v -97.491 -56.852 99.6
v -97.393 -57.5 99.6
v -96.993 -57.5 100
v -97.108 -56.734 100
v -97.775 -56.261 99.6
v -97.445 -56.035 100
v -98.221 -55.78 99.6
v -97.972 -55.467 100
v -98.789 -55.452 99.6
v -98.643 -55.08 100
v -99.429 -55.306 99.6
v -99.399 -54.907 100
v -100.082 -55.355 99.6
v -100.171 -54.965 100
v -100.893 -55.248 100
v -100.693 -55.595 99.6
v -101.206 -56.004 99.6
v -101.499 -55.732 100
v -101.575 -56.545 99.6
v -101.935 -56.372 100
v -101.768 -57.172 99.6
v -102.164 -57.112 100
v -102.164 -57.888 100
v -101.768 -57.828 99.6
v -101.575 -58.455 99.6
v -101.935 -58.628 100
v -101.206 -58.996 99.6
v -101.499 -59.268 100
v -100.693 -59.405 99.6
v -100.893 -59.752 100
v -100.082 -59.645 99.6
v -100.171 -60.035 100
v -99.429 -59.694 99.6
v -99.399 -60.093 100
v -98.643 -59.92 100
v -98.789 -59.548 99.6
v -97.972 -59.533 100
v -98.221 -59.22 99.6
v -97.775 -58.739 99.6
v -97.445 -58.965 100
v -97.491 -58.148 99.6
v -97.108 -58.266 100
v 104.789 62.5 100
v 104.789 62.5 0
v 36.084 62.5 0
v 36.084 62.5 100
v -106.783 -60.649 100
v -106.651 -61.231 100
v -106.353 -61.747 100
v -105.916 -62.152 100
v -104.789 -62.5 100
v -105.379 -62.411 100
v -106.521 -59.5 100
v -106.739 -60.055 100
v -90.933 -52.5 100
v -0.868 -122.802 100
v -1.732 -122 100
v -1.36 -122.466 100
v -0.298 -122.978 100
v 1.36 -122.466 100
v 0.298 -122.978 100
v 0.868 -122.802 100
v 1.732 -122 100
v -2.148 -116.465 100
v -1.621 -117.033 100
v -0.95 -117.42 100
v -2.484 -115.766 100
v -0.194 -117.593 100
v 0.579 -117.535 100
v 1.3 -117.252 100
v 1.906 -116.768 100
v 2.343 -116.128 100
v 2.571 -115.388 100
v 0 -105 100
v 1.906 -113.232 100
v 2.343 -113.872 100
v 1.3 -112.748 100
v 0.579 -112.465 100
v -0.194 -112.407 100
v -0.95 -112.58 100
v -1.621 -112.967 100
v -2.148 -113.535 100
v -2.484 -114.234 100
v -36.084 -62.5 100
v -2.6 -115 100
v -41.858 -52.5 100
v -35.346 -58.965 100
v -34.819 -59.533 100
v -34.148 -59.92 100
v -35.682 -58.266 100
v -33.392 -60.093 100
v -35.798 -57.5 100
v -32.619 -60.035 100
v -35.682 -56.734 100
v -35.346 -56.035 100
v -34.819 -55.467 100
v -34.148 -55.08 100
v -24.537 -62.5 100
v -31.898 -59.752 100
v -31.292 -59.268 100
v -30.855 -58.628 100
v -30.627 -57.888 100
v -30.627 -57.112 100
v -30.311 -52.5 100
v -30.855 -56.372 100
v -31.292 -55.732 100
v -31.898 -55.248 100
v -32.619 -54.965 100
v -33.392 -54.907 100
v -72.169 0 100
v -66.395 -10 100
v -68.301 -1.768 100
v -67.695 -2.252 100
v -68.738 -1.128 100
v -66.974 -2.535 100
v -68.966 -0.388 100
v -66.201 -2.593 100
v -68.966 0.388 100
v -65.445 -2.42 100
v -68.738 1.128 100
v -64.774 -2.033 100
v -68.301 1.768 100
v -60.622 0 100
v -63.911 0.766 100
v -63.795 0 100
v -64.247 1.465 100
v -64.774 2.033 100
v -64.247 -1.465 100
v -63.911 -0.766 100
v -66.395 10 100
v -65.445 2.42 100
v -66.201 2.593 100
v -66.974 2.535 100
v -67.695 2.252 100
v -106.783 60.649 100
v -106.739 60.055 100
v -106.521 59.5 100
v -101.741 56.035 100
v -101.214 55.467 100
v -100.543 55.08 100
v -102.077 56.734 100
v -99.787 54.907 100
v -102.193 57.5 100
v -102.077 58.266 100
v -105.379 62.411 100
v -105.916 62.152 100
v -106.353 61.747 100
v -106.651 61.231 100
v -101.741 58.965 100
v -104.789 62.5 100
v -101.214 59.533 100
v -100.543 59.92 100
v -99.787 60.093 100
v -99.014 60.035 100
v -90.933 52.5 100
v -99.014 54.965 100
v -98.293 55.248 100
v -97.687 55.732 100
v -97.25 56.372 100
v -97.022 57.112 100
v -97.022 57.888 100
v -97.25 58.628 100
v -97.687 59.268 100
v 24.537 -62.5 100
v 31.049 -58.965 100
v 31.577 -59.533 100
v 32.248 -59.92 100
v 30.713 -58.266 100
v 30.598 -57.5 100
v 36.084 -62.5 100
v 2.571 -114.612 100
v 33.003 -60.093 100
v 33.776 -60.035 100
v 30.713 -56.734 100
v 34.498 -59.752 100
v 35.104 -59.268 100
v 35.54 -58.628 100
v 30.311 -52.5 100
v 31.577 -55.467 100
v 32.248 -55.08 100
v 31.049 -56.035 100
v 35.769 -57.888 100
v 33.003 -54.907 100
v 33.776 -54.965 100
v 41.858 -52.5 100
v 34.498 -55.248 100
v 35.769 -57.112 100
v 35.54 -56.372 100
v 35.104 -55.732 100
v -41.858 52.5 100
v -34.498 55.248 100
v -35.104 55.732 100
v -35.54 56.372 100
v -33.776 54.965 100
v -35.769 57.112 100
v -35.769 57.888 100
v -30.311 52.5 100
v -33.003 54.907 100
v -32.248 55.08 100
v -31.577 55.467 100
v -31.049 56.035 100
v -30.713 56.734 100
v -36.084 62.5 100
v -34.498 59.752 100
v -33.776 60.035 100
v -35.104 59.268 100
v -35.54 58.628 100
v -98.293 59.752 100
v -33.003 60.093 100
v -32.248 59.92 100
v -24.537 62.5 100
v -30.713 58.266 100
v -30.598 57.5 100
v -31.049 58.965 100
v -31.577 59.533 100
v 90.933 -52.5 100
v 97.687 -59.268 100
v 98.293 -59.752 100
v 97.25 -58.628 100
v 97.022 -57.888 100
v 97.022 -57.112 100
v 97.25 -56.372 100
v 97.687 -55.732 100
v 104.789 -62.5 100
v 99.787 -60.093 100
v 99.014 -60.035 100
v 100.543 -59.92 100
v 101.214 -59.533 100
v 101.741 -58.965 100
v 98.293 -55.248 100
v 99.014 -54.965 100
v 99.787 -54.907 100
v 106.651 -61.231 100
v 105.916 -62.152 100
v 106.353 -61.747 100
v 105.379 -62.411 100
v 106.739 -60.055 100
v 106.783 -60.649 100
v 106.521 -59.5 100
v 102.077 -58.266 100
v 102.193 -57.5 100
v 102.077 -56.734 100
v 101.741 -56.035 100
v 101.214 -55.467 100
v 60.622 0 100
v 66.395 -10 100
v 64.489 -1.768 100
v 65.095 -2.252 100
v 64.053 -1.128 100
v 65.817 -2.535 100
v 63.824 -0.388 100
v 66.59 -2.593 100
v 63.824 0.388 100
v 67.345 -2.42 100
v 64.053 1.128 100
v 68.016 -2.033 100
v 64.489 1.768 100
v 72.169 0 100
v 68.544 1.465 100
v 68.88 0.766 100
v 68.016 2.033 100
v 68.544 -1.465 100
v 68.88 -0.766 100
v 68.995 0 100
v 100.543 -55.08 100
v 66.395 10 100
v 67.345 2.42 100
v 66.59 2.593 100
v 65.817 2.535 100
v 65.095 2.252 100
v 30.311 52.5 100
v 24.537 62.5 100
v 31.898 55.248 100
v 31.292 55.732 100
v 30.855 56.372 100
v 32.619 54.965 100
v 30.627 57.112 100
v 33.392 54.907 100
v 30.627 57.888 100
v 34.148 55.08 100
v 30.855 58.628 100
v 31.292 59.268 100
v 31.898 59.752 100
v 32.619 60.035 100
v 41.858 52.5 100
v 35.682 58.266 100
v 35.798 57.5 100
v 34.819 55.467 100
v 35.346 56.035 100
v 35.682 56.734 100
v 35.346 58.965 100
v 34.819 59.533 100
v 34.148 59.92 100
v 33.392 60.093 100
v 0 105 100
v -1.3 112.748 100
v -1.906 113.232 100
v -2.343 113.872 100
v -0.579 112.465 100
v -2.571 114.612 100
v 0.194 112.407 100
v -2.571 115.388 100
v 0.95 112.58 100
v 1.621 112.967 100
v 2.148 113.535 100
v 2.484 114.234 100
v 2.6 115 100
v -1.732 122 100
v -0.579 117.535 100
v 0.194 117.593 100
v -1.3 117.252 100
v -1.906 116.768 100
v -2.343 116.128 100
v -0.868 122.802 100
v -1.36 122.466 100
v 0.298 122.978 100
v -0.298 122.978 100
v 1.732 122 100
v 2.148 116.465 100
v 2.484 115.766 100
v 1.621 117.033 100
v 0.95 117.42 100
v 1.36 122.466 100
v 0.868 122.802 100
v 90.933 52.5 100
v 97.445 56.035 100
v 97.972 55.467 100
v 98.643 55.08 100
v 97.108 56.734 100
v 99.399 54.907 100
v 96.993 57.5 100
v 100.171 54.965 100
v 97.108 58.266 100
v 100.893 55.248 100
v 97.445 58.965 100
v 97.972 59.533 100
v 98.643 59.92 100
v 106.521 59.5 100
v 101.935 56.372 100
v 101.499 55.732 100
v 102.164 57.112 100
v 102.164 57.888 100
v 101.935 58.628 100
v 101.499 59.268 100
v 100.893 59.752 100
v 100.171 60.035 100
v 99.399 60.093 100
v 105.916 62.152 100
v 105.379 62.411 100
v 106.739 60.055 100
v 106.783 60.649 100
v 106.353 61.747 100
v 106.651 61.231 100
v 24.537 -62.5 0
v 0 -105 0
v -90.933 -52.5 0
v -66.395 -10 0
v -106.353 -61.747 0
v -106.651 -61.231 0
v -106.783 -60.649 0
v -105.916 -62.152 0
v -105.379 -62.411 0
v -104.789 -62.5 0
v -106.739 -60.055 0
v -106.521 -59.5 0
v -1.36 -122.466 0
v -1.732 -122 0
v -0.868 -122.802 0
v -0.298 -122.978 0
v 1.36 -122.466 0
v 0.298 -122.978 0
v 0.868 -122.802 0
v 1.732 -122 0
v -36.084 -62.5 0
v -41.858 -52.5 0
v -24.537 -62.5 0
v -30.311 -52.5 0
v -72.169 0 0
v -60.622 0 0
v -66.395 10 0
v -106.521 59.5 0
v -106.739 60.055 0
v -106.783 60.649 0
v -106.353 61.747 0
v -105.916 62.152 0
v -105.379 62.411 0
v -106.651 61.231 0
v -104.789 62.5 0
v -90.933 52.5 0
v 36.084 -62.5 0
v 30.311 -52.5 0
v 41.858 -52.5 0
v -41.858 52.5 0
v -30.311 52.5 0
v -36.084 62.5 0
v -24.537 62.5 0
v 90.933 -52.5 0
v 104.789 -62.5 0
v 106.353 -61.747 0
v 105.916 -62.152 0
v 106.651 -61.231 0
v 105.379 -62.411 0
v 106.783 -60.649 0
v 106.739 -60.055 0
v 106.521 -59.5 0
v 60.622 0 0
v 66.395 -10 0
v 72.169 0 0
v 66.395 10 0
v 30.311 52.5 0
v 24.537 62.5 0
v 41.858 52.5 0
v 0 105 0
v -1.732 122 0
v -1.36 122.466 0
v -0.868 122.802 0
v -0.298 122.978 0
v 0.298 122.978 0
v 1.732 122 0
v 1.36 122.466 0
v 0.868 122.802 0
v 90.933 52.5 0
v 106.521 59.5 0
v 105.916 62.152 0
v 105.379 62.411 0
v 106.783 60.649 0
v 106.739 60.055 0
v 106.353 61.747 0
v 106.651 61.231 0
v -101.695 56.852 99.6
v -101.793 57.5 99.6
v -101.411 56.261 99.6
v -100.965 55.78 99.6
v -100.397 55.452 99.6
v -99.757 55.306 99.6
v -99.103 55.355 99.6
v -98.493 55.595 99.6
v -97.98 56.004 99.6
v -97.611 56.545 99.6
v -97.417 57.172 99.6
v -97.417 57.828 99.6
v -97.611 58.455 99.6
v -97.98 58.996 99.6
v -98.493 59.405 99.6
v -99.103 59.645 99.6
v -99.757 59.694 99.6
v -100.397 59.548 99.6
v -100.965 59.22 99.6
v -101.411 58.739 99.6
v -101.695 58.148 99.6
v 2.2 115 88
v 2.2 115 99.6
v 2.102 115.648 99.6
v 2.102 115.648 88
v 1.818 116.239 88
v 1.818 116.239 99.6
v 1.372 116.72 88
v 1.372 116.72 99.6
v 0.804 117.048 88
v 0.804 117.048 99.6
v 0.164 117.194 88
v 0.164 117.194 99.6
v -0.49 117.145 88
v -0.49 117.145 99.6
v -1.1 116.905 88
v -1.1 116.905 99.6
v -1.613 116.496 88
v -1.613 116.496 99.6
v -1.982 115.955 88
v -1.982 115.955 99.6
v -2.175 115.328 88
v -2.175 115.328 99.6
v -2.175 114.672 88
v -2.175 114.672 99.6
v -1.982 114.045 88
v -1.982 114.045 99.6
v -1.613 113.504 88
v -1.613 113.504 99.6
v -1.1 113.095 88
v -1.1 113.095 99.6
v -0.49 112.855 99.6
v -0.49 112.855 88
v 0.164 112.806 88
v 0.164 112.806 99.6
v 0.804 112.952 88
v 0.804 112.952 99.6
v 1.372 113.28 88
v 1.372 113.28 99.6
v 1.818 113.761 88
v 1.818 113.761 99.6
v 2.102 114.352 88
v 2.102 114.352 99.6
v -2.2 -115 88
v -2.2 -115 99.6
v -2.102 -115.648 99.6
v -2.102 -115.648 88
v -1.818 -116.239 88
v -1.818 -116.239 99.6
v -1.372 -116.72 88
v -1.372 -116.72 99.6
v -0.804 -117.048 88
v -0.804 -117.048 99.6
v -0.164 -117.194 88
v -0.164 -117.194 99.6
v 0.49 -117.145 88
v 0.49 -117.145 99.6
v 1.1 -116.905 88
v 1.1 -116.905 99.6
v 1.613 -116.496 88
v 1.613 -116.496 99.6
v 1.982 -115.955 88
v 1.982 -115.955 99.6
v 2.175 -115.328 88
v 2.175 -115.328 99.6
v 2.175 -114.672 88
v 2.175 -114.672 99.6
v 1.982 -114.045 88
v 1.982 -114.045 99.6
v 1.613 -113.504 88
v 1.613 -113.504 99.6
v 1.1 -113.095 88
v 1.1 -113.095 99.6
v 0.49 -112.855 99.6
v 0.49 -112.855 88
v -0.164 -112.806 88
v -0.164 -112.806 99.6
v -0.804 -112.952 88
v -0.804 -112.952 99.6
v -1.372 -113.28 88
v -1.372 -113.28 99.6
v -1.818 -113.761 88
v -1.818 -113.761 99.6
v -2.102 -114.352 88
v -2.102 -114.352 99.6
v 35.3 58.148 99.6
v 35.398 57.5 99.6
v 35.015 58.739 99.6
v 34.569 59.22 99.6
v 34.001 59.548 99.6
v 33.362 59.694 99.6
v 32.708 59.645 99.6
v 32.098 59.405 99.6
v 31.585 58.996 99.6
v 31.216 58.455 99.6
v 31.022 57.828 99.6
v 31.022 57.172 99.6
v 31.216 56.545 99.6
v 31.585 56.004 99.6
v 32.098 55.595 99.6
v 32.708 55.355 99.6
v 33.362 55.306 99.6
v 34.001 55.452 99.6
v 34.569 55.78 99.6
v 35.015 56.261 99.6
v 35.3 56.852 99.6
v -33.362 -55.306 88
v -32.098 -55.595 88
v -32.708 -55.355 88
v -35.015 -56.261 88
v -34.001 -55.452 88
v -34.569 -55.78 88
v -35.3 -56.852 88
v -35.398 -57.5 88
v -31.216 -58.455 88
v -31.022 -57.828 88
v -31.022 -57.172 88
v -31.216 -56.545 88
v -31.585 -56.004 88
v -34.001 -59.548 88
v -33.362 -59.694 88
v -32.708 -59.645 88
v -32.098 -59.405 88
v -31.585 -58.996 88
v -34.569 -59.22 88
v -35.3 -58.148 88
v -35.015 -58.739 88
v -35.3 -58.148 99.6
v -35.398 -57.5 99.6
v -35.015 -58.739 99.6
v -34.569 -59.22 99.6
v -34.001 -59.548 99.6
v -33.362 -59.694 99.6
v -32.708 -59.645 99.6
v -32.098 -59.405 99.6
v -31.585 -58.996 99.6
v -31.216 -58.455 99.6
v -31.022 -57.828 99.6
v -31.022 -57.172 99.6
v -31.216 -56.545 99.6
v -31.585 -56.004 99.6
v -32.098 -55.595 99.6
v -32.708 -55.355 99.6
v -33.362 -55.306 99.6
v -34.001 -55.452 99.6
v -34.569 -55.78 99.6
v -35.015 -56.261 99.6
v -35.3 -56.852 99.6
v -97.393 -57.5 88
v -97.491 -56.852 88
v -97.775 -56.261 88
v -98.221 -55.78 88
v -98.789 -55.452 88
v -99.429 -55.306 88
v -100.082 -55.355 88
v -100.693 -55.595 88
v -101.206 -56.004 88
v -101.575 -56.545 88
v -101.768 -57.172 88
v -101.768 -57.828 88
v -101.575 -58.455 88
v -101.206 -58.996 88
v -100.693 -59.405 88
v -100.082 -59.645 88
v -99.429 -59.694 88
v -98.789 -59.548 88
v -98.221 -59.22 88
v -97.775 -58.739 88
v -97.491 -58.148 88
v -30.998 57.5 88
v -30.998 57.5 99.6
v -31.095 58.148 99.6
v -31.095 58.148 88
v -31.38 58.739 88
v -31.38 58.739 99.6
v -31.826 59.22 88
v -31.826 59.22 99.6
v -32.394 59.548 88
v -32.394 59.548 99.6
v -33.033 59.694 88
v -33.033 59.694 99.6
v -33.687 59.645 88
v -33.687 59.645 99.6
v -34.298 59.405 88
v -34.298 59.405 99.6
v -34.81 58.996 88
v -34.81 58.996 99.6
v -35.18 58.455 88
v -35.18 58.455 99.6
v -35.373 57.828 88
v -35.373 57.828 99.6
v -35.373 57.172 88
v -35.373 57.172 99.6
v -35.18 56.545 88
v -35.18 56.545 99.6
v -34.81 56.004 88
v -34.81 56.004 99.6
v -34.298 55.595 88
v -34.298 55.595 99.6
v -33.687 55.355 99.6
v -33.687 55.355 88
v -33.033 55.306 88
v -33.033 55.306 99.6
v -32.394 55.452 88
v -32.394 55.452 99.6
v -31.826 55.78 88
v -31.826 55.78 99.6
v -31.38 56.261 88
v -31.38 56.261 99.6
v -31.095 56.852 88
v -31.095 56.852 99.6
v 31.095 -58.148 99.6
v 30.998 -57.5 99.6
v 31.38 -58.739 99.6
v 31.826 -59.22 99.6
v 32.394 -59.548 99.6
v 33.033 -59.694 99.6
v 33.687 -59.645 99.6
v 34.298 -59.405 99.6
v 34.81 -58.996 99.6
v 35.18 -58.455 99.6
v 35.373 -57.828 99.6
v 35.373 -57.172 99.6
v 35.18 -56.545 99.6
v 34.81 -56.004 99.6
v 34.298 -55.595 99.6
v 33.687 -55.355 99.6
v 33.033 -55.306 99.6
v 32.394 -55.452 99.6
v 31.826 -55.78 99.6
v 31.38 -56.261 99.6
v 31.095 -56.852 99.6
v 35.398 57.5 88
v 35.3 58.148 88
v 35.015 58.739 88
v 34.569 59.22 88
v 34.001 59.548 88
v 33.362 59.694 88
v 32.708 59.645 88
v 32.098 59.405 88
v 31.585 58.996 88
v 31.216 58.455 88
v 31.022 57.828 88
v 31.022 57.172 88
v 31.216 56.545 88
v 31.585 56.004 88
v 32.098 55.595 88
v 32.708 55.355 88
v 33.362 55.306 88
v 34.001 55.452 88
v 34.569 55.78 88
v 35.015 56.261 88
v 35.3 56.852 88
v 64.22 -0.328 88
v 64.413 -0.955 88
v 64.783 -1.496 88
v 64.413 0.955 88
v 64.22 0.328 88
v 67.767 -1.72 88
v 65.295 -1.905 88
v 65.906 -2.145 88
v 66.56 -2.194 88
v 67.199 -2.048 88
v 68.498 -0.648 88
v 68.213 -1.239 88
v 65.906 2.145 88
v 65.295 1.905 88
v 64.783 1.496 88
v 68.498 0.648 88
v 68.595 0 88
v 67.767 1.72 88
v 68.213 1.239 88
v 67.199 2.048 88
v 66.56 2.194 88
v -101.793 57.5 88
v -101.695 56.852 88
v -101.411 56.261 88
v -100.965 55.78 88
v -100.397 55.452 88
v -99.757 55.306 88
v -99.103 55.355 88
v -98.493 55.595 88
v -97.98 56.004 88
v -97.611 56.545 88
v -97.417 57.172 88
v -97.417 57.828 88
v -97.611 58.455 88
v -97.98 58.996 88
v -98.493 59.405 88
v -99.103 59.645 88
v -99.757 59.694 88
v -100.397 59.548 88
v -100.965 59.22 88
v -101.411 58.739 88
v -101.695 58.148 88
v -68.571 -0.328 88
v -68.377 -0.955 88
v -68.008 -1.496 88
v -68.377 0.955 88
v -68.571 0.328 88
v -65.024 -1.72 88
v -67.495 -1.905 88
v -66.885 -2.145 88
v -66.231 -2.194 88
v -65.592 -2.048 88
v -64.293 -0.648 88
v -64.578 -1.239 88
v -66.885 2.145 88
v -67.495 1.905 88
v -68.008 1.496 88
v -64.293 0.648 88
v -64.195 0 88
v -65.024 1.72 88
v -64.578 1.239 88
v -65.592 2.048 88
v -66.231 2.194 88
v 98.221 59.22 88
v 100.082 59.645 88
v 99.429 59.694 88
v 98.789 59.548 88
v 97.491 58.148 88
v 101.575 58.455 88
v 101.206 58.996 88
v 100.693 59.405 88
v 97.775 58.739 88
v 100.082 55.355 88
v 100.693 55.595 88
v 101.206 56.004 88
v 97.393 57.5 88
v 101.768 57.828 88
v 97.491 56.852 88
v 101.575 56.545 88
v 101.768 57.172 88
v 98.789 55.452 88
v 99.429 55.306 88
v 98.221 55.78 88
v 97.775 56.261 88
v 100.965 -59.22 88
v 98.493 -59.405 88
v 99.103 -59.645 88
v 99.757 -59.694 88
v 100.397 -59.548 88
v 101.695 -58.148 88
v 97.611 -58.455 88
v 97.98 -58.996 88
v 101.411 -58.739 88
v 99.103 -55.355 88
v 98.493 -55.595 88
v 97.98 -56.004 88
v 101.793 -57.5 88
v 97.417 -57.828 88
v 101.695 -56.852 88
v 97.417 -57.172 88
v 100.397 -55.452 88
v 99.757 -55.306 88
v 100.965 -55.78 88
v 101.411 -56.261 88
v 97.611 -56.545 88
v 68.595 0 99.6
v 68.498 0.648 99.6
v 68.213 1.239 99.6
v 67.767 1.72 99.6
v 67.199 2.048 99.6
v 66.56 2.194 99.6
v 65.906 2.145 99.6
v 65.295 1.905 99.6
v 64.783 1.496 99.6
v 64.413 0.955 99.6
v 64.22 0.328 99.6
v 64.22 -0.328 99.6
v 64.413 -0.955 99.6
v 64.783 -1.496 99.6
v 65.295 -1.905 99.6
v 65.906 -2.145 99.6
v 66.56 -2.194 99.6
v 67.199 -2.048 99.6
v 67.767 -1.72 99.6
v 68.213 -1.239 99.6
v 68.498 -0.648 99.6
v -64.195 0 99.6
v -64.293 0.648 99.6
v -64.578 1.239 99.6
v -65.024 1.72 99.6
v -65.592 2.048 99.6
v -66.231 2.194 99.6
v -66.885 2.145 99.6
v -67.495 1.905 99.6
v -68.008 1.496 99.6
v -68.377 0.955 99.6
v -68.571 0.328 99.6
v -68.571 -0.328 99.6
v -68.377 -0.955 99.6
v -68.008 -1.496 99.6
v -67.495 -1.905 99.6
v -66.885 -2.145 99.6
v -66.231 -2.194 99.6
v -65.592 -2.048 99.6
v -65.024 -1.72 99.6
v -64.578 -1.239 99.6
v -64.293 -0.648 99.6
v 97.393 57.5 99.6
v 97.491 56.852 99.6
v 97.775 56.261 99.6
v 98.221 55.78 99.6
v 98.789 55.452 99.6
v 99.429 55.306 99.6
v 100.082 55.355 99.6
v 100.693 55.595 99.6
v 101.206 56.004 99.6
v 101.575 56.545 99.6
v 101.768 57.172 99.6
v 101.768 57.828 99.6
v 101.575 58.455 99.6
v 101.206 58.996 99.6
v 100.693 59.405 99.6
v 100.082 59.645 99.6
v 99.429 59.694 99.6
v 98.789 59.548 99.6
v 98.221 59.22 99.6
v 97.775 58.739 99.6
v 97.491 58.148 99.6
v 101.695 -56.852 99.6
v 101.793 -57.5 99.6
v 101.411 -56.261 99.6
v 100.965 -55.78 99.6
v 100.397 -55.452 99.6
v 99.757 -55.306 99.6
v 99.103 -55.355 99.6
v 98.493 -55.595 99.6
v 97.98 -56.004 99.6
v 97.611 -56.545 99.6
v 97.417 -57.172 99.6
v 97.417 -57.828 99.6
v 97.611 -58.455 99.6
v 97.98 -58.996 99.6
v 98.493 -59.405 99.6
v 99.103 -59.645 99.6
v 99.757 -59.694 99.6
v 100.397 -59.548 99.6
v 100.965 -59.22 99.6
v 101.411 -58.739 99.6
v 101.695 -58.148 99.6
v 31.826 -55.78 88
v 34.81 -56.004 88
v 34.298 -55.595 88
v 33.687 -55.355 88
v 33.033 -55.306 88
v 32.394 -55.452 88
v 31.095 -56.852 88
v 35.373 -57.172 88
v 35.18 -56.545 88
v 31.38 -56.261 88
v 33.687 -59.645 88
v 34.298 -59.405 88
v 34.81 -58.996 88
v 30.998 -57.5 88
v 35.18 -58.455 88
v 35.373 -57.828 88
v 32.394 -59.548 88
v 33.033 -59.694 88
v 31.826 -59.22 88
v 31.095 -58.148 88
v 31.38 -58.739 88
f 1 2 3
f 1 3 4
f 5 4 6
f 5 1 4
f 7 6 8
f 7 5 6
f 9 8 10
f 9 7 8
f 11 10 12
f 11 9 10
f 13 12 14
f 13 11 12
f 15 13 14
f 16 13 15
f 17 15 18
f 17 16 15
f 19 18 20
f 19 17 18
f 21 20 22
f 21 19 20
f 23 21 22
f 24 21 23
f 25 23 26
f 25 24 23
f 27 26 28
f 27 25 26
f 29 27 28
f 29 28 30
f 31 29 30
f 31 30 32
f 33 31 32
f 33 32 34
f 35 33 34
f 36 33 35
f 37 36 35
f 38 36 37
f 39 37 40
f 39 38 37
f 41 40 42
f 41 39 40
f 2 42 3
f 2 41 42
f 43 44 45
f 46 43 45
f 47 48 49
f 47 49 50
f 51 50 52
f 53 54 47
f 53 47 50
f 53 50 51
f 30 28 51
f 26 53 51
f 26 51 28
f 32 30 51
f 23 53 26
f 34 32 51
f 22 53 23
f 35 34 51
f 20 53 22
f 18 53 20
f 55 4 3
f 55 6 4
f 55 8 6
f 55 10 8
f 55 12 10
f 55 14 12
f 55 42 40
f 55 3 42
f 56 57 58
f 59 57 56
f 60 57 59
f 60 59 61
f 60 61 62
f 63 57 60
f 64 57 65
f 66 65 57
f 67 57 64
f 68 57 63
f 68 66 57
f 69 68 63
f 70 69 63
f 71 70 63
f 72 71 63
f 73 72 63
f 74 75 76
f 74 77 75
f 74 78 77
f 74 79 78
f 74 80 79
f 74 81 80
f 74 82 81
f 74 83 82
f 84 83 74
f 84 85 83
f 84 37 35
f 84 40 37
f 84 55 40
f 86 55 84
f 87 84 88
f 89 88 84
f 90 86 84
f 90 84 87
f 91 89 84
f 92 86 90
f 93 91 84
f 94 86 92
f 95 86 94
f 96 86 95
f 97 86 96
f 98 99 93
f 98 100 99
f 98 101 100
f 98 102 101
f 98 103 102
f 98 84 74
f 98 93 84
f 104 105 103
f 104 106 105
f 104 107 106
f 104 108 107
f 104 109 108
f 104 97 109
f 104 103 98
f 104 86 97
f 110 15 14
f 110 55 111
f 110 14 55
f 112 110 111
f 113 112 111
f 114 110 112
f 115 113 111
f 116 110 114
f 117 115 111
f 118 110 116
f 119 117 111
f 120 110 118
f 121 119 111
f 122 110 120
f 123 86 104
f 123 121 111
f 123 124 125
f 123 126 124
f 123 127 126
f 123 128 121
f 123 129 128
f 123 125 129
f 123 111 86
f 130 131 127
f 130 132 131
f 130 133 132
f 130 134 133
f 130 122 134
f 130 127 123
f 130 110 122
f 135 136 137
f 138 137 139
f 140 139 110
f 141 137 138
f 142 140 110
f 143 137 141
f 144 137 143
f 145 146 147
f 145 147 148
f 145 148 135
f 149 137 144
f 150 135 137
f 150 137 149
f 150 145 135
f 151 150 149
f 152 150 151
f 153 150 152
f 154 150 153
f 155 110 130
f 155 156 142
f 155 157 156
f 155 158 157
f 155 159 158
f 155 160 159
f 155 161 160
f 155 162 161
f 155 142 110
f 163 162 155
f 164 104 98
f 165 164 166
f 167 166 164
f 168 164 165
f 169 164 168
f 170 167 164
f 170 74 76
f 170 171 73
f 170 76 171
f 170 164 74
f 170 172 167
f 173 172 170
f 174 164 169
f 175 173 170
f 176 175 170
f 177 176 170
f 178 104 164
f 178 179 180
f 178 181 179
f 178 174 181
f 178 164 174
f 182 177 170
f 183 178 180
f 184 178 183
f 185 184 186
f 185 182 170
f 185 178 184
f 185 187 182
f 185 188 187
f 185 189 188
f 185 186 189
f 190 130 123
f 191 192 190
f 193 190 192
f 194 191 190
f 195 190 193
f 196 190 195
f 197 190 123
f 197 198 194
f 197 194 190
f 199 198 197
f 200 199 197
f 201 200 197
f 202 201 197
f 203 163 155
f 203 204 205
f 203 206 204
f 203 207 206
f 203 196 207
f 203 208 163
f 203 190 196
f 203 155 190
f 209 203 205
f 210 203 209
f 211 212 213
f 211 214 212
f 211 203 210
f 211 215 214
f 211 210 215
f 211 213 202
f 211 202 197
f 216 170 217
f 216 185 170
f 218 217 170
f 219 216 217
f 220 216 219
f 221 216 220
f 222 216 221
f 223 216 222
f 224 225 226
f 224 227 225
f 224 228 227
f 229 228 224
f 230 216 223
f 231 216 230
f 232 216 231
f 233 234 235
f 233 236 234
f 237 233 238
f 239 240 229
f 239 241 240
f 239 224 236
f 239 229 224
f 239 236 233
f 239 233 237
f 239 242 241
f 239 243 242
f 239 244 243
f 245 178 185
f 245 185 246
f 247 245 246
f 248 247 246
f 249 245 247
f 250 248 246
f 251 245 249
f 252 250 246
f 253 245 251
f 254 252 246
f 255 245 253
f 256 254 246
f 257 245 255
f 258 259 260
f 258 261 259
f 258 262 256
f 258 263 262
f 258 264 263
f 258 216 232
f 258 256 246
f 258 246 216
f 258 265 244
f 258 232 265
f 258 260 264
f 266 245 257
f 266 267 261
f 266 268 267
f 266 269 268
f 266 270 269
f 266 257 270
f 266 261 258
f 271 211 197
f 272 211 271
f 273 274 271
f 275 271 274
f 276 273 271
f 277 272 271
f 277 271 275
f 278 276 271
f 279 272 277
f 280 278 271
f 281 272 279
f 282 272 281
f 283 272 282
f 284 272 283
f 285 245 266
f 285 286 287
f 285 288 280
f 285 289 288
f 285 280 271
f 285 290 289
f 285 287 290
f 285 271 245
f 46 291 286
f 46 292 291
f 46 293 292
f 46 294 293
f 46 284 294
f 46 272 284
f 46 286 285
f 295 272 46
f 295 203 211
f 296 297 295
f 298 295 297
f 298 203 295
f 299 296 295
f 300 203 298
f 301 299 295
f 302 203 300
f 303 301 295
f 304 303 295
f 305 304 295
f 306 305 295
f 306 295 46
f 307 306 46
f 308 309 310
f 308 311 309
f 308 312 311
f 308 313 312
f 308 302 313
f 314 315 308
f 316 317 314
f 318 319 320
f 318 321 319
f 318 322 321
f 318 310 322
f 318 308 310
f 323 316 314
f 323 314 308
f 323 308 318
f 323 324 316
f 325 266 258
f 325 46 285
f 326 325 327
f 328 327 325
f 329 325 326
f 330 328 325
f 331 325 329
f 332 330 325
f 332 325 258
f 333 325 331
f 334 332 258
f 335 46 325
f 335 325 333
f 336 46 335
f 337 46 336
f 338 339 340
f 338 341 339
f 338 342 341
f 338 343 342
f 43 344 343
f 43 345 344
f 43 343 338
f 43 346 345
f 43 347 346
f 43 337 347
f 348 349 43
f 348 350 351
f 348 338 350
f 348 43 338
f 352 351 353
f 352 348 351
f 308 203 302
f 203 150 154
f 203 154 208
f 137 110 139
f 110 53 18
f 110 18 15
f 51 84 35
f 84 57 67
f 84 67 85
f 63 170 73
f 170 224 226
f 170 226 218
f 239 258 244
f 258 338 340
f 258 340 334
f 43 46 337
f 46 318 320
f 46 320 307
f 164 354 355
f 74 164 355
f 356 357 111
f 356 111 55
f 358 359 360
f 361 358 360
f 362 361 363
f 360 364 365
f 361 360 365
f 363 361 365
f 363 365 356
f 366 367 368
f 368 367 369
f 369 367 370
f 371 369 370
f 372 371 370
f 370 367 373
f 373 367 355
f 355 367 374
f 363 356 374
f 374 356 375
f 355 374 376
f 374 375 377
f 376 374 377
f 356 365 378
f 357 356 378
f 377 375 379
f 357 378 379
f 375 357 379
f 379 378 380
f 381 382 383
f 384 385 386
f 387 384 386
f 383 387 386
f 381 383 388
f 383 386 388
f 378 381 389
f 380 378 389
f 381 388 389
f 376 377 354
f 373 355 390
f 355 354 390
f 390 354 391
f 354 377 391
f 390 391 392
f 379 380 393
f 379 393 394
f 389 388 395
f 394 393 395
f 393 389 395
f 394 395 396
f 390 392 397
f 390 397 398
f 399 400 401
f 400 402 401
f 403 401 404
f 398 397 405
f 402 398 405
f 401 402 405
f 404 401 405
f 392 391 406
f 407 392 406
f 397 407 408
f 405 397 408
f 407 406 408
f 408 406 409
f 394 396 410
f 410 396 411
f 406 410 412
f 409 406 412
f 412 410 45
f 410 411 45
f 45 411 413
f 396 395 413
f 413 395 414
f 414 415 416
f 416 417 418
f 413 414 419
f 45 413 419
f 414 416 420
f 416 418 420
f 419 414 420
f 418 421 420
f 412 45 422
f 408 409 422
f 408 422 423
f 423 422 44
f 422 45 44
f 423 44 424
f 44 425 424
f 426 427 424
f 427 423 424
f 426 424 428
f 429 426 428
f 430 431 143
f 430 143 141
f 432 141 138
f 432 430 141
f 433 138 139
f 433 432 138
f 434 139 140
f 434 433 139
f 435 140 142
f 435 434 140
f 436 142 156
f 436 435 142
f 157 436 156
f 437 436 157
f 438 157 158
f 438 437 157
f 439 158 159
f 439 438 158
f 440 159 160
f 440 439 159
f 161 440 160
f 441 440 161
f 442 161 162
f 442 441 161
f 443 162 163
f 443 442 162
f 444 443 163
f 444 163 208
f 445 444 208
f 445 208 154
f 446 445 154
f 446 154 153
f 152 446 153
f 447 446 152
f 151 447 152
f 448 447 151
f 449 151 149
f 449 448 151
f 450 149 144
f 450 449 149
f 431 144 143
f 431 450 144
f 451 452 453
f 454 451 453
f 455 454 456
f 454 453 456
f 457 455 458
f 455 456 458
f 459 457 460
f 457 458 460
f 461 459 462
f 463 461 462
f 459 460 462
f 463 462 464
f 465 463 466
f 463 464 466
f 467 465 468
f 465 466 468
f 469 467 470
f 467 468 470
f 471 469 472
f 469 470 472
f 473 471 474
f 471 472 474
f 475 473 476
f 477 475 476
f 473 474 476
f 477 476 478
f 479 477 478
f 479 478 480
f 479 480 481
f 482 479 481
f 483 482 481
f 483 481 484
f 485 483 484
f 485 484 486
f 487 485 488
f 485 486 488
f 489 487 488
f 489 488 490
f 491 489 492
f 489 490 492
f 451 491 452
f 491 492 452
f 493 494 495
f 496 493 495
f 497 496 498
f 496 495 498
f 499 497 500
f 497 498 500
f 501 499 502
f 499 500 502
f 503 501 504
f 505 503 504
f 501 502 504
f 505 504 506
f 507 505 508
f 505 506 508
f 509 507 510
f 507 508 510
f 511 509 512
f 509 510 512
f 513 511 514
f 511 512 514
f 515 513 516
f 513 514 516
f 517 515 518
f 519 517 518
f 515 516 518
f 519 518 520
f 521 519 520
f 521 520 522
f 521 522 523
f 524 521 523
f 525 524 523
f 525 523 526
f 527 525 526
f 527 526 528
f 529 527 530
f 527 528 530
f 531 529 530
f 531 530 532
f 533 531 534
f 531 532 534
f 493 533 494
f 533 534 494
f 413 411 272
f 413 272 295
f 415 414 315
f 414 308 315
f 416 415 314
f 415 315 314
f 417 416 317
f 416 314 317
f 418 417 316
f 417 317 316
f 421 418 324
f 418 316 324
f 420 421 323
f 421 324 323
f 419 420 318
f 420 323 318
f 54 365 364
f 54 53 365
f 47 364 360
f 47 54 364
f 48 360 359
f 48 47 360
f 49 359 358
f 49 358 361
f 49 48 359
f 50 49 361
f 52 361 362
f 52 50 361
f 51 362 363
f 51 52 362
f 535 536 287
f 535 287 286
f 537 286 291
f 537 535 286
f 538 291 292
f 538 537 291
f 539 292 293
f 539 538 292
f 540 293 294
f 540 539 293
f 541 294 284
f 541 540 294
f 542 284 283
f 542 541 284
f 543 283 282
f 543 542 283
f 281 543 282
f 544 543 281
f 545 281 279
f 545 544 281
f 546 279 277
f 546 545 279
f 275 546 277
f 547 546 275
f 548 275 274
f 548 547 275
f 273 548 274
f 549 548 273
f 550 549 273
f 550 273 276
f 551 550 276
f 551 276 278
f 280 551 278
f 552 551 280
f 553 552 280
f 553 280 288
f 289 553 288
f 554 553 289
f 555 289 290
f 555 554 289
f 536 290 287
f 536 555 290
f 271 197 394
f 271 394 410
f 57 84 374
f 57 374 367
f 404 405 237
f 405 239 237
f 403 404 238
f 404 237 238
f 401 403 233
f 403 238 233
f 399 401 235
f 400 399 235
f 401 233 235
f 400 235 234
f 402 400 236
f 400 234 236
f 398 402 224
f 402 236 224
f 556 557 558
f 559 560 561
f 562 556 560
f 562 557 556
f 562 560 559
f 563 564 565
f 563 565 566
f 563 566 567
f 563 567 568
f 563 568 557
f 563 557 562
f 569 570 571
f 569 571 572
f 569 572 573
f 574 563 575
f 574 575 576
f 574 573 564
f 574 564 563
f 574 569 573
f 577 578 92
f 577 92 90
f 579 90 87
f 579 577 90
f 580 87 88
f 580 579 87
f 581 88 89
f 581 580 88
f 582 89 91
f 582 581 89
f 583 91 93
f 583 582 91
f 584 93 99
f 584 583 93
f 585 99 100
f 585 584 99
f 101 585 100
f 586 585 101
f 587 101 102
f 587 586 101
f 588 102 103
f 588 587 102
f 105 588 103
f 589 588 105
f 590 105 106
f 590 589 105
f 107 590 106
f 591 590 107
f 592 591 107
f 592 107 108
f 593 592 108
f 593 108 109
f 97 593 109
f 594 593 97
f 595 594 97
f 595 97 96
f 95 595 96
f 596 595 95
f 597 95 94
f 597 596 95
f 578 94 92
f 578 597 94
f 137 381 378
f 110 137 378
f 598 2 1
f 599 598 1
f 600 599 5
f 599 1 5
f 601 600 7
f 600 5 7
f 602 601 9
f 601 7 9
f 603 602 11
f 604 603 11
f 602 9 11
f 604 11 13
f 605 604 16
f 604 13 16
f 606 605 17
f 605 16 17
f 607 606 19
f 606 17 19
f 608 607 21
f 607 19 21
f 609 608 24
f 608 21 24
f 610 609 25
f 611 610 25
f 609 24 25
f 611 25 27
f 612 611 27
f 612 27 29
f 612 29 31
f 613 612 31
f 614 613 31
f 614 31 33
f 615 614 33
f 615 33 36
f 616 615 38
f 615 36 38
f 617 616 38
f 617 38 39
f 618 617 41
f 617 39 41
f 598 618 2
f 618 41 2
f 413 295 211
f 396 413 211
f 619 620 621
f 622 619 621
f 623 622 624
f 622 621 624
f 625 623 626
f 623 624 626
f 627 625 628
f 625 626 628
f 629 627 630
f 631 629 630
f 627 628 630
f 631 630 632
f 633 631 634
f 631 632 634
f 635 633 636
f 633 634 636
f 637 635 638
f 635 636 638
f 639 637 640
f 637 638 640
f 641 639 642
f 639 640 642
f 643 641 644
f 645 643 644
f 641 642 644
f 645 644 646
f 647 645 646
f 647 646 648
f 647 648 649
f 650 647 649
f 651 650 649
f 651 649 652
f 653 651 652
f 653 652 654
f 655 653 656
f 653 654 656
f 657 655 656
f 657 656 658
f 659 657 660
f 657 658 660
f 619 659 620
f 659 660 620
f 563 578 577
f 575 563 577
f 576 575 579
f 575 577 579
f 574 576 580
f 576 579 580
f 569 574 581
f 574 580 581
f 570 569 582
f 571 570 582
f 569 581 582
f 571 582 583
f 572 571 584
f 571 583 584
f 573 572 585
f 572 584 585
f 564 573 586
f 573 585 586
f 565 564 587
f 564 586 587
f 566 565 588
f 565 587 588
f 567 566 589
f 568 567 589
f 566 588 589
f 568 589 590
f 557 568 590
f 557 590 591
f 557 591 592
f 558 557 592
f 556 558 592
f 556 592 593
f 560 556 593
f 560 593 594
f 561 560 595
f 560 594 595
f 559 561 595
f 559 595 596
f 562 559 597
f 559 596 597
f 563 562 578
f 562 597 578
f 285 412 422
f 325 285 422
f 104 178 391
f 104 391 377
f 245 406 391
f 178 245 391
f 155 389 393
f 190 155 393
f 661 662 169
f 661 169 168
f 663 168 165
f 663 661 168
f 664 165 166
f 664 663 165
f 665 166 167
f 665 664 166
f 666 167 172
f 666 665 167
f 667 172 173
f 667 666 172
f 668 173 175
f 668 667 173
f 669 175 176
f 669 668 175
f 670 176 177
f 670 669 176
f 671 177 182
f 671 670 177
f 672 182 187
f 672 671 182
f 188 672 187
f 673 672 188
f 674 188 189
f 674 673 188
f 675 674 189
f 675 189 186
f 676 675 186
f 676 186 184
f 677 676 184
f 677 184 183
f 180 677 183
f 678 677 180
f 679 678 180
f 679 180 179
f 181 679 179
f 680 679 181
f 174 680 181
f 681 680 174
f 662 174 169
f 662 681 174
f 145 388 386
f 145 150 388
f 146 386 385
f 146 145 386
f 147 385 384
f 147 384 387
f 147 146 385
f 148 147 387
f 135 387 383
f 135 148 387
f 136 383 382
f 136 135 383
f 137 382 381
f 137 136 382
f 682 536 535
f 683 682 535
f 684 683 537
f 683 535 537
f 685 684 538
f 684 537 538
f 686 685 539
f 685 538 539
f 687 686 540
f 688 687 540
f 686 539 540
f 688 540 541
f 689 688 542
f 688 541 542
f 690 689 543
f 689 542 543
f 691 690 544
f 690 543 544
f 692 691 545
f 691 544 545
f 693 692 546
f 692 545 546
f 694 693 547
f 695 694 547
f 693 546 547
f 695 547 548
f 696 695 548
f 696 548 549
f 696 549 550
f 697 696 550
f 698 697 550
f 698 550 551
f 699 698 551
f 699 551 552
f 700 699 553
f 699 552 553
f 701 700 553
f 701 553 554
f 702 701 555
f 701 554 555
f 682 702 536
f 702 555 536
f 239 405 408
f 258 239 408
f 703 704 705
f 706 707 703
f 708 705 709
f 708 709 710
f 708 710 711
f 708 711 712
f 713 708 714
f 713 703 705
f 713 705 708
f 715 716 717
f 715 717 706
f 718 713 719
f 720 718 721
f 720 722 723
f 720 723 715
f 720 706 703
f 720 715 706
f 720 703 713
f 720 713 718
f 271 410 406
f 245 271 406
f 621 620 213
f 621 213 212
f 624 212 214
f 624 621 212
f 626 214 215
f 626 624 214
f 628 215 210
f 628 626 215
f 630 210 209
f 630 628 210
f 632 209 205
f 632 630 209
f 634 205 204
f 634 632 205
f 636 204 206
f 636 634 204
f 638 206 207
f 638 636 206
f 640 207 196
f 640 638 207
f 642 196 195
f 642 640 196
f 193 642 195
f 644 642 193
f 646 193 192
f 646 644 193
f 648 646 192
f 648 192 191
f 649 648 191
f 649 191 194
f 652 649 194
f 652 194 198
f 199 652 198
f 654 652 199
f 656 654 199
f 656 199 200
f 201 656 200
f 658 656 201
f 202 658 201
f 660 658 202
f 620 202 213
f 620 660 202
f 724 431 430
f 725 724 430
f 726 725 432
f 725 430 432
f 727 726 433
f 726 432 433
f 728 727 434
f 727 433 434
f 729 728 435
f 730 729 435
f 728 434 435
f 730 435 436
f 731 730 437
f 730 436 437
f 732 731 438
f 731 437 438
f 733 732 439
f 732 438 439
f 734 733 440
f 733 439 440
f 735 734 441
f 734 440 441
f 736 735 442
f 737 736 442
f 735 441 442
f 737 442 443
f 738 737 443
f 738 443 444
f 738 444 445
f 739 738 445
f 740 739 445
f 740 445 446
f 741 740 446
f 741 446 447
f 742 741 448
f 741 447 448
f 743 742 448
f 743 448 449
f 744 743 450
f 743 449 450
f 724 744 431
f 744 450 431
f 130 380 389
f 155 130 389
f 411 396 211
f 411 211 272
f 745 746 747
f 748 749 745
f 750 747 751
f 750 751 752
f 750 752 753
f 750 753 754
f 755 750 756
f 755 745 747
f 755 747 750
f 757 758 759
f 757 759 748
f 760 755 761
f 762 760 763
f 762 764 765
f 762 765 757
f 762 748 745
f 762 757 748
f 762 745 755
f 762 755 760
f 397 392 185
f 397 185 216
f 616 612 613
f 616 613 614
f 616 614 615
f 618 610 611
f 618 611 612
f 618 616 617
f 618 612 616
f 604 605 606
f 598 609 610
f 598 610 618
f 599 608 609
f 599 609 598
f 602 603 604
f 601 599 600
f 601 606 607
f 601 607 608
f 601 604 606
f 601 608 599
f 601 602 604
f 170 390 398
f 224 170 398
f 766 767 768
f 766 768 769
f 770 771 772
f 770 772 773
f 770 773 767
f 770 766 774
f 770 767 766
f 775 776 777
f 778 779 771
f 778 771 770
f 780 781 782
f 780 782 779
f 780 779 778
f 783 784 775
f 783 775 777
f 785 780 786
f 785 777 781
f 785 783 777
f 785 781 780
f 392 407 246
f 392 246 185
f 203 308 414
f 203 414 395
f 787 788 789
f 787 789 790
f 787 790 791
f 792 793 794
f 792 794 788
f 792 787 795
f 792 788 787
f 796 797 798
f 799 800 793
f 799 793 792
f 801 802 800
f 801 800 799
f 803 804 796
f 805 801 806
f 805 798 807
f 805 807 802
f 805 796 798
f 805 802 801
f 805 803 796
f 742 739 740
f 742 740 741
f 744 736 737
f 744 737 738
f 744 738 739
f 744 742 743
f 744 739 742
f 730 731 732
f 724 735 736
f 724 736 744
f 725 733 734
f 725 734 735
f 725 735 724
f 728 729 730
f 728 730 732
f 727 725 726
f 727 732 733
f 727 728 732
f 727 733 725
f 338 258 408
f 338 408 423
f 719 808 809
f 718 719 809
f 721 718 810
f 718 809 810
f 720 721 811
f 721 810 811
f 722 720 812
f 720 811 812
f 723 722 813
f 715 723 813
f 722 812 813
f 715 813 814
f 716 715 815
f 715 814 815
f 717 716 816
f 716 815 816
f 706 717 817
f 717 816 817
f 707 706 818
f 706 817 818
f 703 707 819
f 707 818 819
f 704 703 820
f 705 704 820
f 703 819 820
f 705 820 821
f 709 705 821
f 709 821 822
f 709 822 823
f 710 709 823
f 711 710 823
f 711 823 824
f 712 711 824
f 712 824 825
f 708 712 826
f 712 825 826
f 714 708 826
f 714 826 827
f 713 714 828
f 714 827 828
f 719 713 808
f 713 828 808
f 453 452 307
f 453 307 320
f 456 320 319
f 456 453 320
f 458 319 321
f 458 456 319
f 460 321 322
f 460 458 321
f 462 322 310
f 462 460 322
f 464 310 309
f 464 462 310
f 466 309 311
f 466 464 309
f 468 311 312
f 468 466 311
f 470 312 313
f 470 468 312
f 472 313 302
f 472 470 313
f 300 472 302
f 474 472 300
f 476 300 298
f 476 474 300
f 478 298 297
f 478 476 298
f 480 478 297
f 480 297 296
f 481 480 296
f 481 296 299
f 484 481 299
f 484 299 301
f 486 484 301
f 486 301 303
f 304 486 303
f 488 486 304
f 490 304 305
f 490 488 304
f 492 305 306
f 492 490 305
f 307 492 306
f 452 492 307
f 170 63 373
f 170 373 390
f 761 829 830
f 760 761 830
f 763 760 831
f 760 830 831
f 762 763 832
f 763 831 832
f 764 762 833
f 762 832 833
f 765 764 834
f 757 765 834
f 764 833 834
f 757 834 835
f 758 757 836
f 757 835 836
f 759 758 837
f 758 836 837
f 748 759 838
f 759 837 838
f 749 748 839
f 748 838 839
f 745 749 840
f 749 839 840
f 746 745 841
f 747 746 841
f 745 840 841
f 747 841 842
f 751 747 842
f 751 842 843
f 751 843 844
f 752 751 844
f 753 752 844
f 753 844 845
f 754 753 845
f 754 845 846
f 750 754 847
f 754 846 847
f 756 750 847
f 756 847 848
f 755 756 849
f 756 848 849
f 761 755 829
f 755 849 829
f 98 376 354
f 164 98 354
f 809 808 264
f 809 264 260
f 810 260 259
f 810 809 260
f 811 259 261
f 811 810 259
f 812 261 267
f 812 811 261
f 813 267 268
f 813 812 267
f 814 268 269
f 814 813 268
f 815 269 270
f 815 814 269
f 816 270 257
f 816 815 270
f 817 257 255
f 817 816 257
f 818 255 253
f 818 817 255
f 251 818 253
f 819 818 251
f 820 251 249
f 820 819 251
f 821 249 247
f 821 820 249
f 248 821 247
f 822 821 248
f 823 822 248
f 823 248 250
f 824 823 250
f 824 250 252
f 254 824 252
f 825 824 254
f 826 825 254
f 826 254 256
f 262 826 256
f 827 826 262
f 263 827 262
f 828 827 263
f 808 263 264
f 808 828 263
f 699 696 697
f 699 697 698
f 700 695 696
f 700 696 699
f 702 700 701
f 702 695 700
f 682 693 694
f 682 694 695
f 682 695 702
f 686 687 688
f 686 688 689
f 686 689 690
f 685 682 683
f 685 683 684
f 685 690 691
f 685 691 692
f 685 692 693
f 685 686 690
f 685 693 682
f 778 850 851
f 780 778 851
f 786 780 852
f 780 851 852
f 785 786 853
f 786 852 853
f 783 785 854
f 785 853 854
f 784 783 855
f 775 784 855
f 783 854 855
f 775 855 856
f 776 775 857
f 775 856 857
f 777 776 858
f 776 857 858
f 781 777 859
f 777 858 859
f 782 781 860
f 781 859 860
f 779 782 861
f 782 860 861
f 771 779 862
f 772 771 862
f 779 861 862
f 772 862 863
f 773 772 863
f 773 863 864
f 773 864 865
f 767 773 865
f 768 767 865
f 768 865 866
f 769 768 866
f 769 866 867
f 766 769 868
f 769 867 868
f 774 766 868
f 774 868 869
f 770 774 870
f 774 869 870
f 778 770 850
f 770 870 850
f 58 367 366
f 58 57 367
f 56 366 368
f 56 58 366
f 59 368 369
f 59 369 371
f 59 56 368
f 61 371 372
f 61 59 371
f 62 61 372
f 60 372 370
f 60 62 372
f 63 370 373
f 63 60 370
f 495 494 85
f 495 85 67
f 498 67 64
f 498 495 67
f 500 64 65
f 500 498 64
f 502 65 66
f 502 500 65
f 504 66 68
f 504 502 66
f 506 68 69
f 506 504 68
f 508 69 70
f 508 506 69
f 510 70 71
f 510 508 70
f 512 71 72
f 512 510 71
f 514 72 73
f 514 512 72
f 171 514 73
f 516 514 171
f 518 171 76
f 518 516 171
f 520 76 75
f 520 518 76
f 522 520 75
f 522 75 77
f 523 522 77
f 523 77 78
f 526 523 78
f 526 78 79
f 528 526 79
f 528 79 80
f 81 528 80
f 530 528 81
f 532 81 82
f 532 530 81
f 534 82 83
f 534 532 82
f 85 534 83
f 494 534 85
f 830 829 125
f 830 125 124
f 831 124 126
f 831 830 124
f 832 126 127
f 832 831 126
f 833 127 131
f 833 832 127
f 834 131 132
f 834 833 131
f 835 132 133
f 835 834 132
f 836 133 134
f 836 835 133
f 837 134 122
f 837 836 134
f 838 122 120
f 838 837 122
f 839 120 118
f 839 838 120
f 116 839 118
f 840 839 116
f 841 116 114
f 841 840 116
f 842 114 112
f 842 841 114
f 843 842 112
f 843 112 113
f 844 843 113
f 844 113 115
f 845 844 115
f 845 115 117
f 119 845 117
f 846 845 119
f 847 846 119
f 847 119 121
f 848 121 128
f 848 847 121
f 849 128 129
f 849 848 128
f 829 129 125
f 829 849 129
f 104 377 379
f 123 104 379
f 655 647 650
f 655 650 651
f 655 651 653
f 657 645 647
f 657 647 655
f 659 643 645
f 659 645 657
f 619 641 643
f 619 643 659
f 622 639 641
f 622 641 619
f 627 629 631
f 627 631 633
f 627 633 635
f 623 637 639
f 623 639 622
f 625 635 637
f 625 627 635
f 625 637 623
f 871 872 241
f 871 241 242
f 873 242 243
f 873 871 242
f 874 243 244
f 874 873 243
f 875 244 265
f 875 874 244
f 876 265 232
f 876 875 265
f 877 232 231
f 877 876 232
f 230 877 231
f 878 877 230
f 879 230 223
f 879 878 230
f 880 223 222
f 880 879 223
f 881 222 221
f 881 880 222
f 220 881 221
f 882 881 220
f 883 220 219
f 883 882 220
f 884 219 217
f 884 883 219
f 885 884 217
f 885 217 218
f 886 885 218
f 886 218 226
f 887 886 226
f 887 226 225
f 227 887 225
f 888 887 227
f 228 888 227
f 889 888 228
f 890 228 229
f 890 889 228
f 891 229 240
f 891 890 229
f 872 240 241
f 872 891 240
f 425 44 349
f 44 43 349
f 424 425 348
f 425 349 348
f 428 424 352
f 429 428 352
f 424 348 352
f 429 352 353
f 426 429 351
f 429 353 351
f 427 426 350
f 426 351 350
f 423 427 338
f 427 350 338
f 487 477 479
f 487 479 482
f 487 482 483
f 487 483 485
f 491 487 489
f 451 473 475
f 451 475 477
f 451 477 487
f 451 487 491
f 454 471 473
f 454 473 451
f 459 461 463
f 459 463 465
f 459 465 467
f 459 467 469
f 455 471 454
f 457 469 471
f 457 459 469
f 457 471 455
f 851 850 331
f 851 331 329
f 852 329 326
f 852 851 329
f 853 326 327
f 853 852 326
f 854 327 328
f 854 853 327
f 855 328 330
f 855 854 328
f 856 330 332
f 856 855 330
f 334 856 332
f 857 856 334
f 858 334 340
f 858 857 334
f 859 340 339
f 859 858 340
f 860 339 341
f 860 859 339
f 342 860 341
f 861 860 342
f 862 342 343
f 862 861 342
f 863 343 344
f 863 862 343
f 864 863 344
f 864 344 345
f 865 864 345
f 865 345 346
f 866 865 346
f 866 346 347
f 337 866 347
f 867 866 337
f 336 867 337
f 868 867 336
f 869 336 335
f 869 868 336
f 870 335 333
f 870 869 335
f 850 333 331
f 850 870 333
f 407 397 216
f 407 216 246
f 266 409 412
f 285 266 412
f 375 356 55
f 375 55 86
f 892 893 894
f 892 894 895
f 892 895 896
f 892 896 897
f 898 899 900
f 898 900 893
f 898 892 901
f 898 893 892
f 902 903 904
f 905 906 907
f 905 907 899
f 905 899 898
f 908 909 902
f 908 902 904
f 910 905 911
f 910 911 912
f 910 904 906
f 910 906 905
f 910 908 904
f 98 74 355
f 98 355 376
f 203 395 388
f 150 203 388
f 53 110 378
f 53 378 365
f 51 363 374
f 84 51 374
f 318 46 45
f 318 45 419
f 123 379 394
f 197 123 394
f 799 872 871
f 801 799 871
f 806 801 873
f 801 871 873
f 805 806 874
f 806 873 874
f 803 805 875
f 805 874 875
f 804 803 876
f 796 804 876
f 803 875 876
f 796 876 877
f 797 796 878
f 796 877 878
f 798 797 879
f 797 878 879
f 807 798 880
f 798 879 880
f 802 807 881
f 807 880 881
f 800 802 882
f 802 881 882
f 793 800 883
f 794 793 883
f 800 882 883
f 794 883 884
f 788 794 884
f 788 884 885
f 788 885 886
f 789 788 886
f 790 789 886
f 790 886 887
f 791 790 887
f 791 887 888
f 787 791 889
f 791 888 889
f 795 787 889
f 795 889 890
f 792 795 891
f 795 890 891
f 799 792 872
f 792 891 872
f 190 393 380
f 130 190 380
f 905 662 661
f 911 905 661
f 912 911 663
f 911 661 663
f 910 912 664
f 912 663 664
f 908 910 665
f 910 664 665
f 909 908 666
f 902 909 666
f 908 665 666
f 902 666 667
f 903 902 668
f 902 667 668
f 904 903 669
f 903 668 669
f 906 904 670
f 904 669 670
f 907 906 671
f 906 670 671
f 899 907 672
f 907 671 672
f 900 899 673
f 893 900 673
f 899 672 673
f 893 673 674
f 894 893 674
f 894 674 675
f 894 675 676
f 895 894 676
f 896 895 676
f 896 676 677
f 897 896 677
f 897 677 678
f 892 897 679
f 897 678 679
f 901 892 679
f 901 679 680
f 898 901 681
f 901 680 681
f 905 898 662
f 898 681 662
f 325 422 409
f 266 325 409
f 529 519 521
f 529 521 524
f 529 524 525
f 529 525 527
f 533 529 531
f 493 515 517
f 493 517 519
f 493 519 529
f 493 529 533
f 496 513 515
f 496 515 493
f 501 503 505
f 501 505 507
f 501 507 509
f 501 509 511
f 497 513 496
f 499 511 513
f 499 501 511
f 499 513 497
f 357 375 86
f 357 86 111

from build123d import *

# Parameters (mm, degrees)
EXTRUDE_1_DEPTH     = 100
FILLET_1_R          = 2
SKETCH_2_R          = 2.2
CUT_EXTRUDE_1_DEPTH = 12
CHAMFER_1_SIZE      = 0.4


with BuildPart() as part:
    # Эскиз1 → Бобышка-Вытянуть1 (new body)
    with BuildSketch(Plane.XY):
        Polygon((0, 125), (-36.084391824, 62.5), (-108.253175473, 62.5), (-72.168783649, 0), (-108.253175473, -62.5), (-36.084391824, -62.5), (0, -125), (36.084391824, -62.5), (108.253175473, -62.5), (72.168783649, 0), (108.253175473, 62.5), (36.084391824, 62.5), align=None)
        Polygon((0, 105), (-24.537386441, 62.5), (24.537386441, 62.5), align=None, mode=Mode.SUBTRACT)
        Polygon((-90.932667397, -52.5), (-41.857894516, -52.5), (-66.395280957, -10), align=None, mode=Mode.SUBTRACT)
        Polygon((90.932667397, -52.5), (66.395280957, -10), (41.857894516, -52.5), align=None, mode=Mode.SUBTRACT)
        Polygon((-90.932667397, 52.5), (-41.857894516, 52.5), (-66.395280957, 10), align=None, mode=Mode.SUBTRACT)
        Polygon((90.932667397, 52.5), (66.395280957, 10), (41.857894516, 52.5), align=None, mode=Mode.SUBTRACT)
        Polygon((0, -105), (-24.537386441, -62.5), (24.537386441, -62.5), align=None, mode=Mode.SUBTRACT)
        Polygon((-30.310889132, 52.5), (30.310889132, 52.5), (60.621778265, 0), (30.310889132, -52.5), (-30.310889132, -52.5), (-60.621778265, 0), align=None, mode=Mode.SUBTRACT)
    extrude(amount=EXTRUDE_1_DEPTH)

    # Скругление1
    fillet_1_edges = [part.edges().sort_by_distance(p)[0] for p in [
        (108.253175473, 62.5, 50),
        (108.253175473, -62.5, 50),
        (0, -125, 50),
        (-108.253175473, -62.5, 50),
        (-108.253175473, 62.5, 50),
        (0, 125, 50),
    ]]
    fillet(fillet_1_edges, radius=FILLET_1_R)

    # Эскиз2 → Вырез-Вытянуть1 (cut)
    with BuildSketch(Plane.XY.offset(100)):
        with Locations((0, 115)):
            Circle(SKETCH_2_R)
        with Locations((-99.592921435, -57.5)):
            Circle(SKETCH_2_R)
        with Locations((99.592921435, -57.5)):
            Circle(SKETCH_2_R)
        with Locations((-33.197640478, 57.5)):
            Circle(SKETCH_2_R)
        with Locations((33.197640478, 57.5)):
            Circle(SKETCH_2_R)
        with Locations(Location((-99.592921435, 57.5, 0), (0, 0, 180))):
            Circle(SKETCH_2_R)
        with Locations(Location((99.592921435, 57.5, 0), (0, 0, 180))):
            Circle(SKETCH_2_R)
        with Locations(Location((33.197640478, -57.5, 0), (0, 0, 180))):
            Circle(SKETCH_2_R)
        with Locations(Location((-33.197640478, -57.5, 0), (0, 0, 180))):
            Circle(SKETCH_2_R)
        with Locations(Location((0, -115, 0), (0, 0, 180))):
            Circle(SKETCH_2_R)
        with Locations((-66.395280957, 0)):
            Circle(SKETCH_2_R)
        with Locations((66.395280957, 0)):
            Circle(SKETCH_2_R)
    extrude(amount=-CUT_EXTRUDE_1_DEPTH, mode=Mode.SUBTRACT)

    # Фаска1
    chamfer_1_edges = [part.edges().sort_by_distance(p)[0] for p in [
        (-2.2, 115, 100),
        (64.195280957, 0, 100),
        (-68.595280957, 0, 100),
        (2.2, -115, 100),
        (-101.792921435, -57.5, 100),
        (97.392921435, -57.5, 100),
        (-35.397640478, 57.5, 100),
        (30.997640478, 57.5, 100),
        (-97.392921435, 57.5, 100),
        (101.792921435, 57.5, 100),
        (35.397640478, -57.5, 100),
        (-30.997640478, -57.5, 100),
    ]]
    chamfer(chamfer_1_edges, length=CHAMFER_1_SIZE)


solid = part.part
